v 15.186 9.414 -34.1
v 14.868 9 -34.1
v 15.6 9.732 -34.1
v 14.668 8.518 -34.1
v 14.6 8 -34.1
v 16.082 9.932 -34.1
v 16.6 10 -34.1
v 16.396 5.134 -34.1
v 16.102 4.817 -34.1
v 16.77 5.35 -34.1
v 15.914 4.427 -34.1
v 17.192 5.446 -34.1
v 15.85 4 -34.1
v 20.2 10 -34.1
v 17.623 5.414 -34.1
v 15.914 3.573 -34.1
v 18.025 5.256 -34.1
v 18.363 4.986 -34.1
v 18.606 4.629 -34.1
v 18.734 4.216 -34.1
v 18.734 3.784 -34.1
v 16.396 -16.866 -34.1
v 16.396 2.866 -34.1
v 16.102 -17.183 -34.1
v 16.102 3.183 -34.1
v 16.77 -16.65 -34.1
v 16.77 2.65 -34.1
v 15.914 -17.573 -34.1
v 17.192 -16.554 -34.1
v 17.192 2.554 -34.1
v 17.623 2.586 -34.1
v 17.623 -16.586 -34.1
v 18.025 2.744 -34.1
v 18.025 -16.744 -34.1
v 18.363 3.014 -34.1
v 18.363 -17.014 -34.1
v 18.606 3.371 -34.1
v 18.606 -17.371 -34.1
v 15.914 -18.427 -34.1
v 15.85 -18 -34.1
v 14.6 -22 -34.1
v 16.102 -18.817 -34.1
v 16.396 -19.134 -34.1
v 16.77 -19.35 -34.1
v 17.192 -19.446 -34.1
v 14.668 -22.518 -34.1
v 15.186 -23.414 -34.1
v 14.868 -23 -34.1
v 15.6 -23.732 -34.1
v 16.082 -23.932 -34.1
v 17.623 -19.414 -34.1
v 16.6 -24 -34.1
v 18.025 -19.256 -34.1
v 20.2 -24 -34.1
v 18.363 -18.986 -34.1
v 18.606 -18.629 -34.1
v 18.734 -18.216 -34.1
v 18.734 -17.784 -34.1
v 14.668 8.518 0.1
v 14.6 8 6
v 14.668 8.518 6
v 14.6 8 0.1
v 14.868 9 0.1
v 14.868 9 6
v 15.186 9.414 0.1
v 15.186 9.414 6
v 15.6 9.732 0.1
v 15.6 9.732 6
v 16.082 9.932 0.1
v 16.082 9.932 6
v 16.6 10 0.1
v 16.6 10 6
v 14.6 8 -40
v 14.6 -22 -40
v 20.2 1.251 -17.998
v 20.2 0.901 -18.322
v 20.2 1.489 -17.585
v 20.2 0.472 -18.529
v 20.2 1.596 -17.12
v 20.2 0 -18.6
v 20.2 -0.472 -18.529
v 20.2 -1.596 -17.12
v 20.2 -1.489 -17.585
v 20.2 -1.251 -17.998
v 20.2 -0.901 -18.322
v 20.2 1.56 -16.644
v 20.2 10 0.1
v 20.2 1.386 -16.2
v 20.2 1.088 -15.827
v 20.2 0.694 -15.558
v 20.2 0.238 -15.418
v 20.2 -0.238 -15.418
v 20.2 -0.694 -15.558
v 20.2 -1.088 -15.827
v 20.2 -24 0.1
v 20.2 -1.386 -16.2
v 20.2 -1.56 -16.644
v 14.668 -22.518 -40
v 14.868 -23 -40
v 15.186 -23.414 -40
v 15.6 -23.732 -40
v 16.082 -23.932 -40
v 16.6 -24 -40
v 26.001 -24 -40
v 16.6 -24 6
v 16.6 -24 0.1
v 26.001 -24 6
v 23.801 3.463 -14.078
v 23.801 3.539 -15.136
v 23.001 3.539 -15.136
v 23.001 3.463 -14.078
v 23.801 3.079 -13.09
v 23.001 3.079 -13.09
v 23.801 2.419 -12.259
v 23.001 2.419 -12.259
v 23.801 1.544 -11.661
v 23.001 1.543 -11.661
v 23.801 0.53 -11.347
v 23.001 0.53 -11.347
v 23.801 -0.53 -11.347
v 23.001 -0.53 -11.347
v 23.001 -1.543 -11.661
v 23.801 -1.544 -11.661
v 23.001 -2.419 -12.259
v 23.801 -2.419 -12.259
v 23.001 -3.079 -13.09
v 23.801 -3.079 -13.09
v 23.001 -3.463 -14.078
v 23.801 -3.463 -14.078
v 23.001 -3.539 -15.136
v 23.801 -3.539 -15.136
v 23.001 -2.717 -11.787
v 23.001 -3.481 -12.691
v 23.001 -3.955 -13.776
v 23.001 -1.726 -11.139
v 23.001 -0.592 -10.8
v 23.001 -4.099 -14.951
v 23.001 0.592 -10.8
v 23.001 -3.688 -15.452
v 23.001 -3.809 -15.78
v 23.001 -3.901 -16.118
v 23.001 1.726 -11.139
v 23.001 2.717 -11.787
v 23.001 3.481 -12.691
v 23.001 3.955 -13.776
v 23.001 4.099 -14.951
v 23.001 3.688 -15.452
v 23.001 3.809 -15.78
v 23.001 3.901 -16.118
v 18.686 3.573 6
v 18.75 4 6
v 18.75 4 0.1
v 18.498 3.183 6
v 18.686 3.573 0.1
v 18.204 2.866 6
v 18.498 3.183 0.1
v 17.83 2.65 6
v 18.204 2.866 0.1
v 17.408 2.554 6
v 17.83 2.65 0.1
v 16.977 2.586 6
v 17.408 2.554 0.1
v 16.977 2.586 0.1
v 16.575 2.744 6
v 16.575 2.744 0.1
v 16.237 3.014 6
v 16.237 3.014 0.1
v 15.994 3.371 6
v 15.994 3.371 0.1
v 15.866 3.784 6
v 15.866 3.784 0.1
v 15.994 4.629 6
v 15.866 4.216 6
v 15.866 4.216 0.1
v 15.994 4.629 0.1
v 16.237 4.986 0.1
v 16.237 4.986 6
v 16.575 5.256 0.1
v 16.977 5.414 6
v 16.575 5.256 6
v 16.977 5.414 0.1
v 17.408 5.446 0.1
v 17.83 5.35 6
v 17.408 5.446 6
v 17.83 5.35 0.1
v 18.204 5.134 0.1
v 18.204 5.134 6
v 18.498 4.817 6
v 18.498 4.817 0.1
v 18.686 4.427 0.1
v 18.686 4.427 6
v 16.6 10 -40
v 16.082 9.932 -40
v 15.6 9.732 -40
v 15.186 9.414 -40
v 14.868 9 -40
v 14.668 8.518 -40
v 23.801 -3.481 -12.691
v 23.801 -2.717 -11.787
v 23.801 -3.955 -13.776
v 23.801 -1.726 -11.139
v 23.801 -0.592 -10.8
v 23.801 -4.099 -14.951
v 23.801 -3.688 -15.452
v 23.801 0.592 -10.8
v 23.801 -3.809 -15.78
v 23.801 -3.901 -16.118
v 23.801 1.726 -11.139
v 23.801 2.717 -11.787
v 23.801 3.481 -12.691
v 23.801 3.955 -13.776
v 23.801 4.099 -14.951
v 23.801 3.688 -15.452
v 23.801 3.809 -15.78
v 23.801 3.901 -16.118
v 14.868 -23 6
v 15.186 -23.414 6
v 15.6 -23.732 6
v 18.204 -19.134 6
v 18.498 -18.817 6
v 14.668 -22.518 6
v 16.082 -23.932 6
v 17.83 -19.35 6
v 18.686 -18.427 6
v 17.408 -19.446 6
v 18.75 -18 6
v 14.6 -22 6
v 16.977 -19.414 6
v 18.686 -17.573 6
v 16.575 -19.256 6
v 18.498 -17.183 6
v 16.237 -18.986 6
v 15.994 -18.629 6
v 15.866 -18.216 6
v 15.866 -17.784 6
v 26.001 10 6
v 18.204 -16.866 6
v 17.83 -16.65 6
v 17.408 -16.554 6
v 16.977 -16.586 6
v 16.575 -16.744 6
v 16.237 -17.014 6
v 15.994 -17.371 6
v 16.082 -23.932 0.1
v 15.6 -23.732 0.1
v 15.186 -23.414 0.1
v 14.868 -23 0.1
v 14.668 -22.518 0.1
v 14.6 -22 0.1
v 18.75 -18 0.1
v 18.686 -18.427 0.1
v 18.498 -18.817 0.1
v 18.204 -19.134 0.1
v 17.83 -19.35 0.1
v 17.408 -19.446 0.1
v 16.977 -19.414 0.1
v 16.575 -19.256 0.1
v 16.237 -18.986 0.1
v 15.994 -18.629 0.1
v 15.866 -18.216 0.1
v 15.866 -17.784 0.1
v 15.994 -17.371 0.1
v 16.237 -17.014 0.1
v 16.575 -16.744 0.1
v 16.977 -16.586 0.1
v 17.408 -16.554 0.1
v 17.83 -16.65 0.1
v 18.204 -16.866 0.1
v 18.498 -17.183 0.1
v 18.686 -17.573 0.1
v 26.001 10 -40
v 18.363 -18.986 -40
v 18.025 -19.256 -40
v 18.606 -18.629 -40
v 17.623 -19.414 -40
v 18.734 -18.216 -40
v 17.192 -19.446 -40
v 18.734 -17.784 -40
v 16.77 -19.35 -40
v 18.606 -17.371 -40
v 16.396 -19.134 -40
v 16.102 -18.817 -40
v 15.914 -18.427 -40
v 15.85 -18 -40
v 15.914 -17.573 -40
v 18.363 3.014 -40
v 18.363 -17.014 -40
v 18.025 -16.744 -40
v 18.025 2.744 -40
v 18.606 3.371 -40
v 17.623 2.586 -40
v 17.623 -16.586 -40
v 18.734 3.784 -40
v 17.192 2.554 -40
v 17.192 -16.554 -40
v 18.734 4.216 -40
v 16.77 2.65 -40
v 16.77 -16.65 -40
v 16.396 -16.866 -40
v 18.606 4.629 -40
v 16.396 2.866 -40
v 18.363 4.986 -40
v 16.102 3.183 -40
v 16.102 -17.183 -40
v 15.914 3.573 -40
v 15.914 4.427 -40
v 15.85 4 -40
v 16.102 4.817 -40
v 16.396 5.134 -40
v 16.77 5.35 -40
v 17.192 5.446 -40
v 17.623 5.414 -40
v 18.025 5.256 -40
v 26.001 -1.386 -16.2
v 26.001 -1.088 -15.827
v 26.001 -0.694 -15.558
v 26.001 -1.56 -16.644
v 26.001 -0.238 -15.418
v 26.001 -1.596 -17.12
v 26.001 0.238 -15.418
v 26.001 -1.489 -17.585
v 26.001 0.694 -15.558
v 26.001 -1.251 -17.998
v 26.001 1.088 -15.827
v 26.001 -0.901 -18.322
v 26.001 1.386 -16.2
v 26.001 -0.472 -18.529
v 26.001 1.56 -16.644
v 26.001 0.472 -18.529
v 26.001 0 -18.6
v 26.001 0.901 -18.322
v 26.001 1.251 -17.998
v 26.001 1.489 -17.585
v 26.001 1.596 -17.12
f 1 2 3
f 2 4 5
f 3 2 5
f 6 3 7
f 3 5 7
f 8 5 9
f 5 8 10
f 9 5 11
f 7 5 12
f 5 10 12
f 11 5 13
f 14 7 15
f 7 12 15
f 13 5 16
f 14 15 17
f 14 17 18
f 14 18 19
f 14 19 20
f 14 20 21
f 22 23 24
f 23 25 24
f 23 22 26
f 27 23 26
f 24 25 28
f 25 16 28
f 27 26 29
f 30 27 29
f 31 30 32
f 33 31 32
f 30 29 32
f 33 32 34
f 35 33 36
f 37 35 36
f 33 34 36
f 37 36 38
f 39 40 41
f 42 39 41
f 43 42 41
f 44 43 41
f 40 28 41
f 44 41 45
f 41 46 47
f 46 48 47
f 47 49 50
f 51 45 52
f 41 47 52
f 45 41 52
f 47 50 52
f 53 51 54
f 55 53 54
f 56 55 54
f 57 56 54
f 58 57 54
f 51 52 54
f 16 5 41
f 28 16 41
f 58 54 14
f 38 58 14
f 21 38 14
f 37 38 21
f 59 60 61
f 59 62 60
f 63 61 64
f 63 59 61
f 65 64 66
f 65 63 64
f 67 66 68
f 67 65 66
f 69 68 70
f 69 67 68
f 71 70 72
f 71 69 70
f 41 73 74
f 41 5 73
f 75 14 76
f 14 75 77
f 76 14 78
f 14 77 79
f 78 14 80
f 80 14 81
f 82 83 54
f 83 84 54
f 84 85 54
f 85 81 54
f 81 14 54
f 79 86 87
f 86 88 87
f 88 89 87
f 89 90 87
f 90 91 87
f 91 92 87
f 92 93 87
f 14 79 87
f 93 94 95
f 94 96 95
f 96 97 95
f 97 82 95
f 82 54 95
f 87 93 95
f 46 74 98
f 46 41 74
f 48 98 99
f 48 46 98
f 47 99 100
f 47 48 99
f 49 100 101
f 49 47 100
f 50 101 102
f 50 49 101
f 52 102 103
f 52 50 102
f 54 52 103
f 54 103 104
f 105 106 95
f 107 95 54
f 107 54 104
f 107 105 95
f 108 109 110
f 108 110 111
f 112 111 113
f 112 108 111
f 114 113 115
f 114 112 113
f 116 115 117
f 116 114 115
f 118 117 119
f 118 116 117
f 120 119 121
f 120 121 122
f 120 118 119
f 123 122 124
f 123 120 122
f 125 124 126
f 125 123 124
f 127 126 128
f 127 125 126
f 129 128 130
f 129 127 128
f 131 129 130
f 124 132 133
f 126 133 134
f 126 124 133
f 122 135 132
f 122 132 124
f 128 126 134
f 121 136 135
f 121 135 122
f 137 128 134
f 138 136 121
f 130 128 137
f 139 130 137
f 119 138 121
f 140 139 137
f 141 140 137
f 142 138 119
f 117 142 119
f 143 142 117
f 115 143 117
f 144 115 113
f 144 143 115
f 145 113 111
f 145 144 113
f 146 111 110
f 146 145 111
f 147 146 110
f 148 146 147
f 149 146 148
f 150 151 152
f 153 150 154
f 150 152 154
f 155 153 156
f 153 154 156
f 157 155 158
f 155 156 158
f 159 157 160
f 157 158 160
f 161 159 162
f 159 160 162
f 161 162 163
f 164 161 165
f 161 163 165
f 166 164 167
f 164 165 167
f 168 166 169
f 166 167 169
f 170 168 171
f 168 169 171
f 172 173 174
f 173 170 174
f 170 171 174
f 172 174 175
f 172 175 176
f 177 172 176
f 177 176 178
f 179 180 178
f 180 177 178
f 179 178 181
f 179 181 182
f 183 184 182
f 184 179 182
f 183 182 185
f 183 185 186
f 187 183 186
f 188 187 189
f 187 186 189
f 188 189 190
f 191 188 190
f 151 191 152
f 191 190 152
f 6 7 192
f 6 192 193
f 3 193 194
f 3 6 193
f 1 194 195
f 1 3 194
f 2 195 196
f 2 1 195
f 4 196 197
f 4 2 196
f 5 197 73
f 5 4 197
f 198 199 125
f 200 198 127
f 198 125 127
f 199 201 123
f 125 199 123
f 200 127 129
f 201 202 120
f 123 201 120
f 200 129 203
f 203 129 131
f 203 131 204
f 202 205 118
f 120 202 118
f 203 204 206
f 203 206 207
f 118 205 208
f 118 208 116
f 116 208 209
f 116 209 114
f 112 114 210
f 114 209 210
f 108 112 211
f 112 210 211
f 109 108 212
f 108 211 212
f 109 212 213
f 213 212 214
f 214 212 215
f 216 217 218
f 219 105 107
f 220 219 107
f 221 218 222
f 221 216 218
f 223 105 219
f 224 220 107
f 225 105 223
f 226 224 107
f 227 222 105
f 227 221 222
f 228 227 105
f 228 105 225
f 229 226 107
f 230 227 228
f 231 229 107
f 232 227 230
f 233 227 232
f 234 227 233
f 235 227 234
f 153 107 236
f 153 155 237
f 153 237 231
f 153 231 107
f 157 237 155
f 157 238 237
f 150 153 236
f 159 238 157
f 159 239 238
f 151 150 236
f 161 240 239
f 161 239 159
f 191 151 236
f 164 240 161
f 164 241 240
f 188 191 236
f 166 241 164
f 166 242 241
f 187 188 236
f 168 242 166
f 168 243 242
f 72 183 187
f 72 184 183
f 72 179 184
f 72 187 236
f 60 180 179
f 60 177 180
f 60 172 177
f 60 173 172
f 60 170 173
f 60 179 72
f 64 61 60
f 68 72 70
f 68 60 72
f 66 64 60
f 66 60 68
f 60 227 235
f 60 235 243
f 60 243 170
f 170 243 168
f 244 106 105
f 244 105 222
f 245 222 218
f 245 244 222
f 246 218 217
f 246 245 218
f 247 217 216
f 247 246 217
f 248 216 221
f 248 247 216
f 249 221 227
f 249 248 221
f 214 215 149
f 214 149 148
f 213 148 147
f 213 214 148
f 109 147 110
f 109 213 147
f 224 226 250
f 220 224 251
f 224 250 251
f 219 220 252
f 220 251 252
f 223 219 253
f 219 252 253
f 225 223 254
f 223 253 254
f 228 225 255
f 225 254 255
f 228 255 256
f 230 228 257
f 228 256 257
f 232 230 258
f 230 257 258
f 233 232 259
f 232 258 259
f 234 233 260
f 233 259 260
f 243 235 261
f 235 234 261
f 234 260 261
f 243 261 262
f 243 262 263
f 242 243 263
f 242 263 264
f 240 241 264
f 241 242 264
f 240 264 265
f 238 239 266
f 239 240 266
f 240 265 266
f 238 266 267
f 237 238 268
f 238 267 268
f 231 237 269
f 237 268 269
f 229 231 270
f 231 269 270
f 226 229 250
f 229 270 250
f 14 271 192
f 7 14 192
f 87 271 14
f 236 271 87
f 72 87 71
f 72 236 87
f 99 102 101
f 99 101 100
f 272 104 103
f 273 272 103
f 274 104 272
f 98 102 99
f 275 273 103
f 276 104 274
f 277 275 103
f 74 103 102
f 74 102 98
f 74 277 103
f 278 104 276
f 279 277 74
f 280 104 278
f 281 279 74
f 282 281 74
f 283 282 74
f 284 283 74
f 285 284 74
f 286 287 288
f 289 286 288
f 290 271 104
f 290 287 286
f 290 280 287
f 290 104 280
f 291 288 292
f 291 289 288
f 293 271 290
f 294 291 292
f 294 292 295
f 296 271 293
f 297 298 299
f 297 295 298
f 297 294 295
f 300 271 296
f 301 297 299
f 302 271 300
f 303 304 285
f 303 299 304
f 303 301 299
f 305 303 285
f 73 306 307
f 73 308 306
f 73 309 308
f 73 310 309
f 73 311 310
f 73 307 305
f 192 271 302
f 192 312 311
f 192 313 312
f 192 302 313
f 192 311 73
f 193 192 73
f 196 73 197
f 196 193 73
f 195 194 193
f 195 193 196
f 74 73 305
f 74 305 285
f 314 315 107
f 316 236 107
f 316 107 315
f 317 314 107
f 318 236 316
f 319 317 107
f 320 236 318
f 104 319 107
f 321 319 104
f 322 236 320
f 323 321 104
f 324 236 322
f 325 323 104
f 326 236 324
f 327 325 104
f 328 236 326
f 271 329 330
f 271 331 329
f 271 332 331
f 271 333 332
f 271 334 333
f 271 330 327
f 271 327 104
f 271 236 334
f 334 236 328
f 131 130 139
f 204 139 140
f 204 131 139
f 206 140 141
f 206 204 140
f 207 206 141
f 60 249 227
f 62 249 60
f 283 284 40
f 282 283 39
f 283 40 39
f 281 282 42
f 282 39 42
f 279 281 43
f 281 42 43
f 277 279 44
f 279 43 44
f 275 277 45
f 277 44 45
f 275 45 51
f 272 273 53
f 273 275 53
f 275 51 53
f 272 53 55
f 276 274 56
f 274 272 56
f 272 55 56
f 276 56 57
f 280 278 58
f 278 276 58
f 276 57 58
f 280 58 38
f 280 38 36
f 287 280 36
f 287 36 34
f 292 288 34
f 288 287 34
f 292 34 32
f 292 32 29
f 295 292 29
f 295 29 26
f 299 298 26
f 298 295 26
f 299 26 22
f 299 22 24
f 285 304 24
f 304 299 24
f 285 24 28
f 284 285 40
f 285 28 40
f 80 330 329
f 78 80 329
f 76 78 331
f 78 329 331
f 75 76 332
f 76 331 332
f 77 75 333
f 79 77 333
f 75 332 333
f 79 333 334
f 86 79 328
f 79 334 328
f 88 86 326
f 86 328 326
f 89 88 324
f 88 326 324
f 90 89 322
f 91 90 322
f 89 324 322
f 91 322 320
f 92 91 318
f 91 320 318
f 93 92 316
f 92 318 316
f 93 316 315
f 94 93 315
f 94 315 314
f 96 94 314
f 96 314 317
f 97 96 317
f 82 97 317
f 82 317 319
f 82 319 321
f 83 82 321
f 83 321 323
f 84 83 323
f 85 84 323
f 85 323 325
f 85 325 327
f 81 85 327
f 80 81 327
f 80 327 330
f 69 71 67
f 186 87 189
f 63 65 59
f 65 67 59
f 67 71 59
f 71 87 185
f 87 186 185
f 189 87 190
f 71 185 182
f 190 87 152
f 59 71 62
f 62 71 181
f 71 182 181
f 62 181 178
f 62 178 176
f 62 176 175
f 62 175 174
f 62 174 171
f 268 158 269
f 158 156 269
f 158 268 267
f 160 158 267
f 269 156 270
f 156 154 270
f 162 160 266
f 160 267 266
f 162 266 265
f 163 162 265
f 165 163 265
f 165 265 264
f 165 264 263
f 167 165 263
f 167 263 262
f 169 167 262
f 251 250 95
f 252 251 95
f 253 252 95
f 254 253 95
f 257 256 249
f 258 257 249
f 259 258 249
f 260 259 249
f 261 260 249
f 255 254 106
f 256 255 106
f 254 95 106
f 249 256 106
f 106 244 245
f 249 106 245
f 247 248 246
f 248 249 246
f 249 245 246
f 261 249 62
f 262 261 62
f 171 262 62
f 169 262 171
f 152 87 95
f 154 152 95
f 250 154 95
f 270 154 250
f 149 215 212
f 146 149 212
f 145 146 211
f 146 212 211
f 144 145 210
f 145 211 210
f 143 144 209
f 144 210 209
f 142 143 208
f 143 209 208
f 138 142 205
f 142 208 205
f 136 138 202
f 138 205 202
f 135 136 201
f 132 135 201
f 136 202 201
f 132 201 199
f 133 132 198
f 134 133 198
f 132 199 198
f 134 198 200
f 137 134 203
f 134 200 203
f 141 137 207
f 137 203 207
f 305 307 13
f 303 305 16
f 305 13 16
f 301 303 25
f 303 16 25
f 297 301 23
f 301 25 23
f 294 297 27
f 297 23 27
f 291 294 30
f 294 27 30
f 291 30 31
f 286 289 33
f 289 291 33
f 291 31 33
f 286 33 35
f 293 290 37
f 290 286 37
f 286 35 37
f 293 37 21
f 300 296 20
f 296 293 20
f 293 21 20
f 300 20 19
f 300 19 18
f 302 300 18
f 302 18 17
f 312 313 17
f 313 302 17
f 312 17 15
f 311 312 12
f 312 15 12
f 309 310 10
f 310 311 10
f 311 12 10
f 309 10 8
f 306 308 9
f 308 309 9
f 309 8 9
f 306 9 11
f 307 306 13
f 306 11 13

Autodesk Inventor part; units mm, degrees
ref_plane "YZ Plane" through (0, 0, 0) normal (1, 0, 0) x (0, 1, 0)
ref_plane "XZ Plane" through (0, 0, 0) normal (0, 1, 0) x (-1, 0, 0)
ref_plane "XY Plane" through (0, 0, 0) normal (0, 0, 1) x (1, 0, 0)
ref_plane "작업 평면1" through (0, 0, 0) normal (0, 0, 1) x (1, 0, 0)
sketch "스케치1" plane through (0, 0, 0) normal (0, 0, 1) x (1, 0, 0)
  circle A0 centre (0, 0) radius 1.5 projected
  circle A1 centre (0, 0) radius 4.9 projected
  circle A2 centre (0, 0) radius 7.05 projected
  circle A3 centre (7.7781, 7.7783) radius 1.55 projected
  circle A4 centre (-7.7783, 7.7781) radius 1.55 projected
  circle A5 centre (-7.7781, -7.7783) radius 1.55 projected
  circle A6 centre (7.7783, -7.7781) radius 1.55 projected
  circle A7 centre (0, 0) radius 5 projected
  circle A8 centre (0, 0) radius 13.9 projected
  circle A9 centre (0.0001, -11) radius 1.55 projected
  circle A10 centre (-11, -0.0001) radius 1.55 projected
  circle A11 centre (-0.0001, 11) radius 1.55 projected
  circle A12 centre (11, 0.0001) radius 1.55 projected
  line L0 (0, 0) -> (-50, 0)
  line L1 (-15, 14.5) -> (-11.5, 14.5) projected
  line L2 (-15, 14.5) -> (-20.1, 8.5) projected
  line L3 (-20.1, 8.5) -> (-20.1, -44.6) projected
  line L4 (-20.1, -44.6) -> (-15, -50.6) projected
  line L5 (-15, -50.6) -> (15, -50.6) projected
  line L6 (15, -50.6) -> (20.1, -44.6) projected
  line L7 (20.1, -44.6) -> (20.1, 8.5) projected
  line L8 (20.1, 8.5) -> (15, 14.5) projected
  line L9 (11.5, 14.5) -> (15, 14.5) projected
  arc A13 (14.5, 11.5) -> (11.5, 14.5) centre (11.5, 11.5) ccw projected
  line L10 (14.5, -42) -> (14.5, 11.5) projected
  arc A14 (11.5, -45) -> (14.5, -42) centre (11.5, -42) ccw projected
  line L11 (-11.5, -45) -> (11.5, -45) projected
  arc A15 (-14.5, -42) -> (-11.5, -45) centre (-11.5, -42) ccw projected
  line L12 (-14.5, 11.5) -> (-14.5, -42) projected
  arc A16 (-11.5, 14.5) -> (-14.5, 11.5) centre (-11.5, 11.5) ccw projected
  circle A17 centre (17.3, 4) radius 1.35 projected
  circle A18 centre (17.3, -18) radius 1.35 projected
  circle A19 centre (17.3, -40) radius 1.35 projected
  circle A20 centre (11, -47.8) radius 1.35 projected
  circle A21 centre (-17.3, 4) radius 1.35 projected
  circle A22 centre (-17.3, -18) radius 1.35 projected
  circle A23 centre (-17.3, -40) radius 1.35 projected
  circle A24 centre (-11, -47.8) radius 1.35 projected
  circle A25 centre (-17.3, -18) radius 1.45
  circle A26 centre (-17.3, 4) radius 1.45
  arc A27 (-14.6, -42) -> (-11.5, -45.1) centre (-11.5, -42) ccw
  line L13 (-11.5, -45.1) -> (11.5, -45.1)
  arc A28 (11.5, -45.1) -> (14.6, -42) centre (11.5, -42) ccw
  line L14 (14.6, -22) -> (14.6, 8)
  arc A29 (14.6, 11.5) -> (12.5954, 14.4) centre (11.5, 11.5) ccw
  line L15 (12.5954, 14.4) -> (14.9538, 14.4)
  line L16 (14.9538, 14.4) -> (18.6938, 10)
  line L17 (20, -24) -> (20, -44.5632)
  line L18 (20, -44.5632) -> (14.9538, -50.5)
  line L19 (14.9538, -50.5) -> (-14.9538, -50.5)
  line L20 (-14.9538, -50.5) -> (-20, -44.5632)
  line L21 (-18.6938, 10) -> (-14.9538, 14.4)
  line L22 (-14.9538, 14.4) -> (-12.5954, 14.4)
  arc A30 (-12.5954, 14.4) -> (-14.6, 11.5) centre (-11.5, 11.5) ccw
  line L23 (-14.6, 11.5) -> (-14.6, -42)
  line L24 (-17.3, 4) -> (-17.3, 10)
  line L25 (-14.6, 10) -> (-18.0941, 10)
  line L26 (-17.3, -19.35) -> (-17.3, -24)
  line L27 (-14.6, -24) -> (-18.0059, -24)
  line L28 (-20, -44.5632) -> (-20, -24)
  line L29 (-20.0059, -22.0059) -> (-20.0941, 7.9941)
  arc A31 (-18.0941, 10) -> (-20.0941, 7.9941) centre (-18.0941, 8) ccw
  arc A32 (-20.0059, -22.0059) -> (-18.0059, -24) centre (-18.0059, -22) ccw
  line L30 (-36.7788, 11.5) -> (-35.2788, 11.5) projected
  line L31 (-36.7788, 11.5) -> (-36.7788, -41.5) projected
  line L32 (-35.2788, -41.5) -> (-36.7788, -41.5) projected
  spline S0 degree 3 poles (-34.7788, -41) (-34.788, -41.241) (-35.0376, -41.5) (-35.2788, -41.5) knots 0 0 0 0 1 1 1 1 projected
  line L33 (-34.7788, 11) -> (-34.7788, -41) projected
  ellipse E0 centre (-35.2788, 11) end of major axis (-35.2788, 11.5) minor radius 0.5 (-34.7788, 11) -> (-35.2788, 11.5) ccw projected
  line L34 (16.6, -24) -> (18.1, -24)
  line L35 (16.6, 10) -> (18.1, 10)
  line L36 (20.1, -22) -> (20.1, 8)
  circle A33 centre (17.3, 4) radius 1.45
  circle A34 centre (17.3, -18) radius 1.45
  line L37 (18.1, -24) -> (20.1, -24)
  line L38 (20.1, -24) -> (20.1, -22)
  arc A35 (14.6, -22) -> (16.6, -24) centre (16.6, -22) ccw
  line L39 (20.1, 8) -> (20.1, 10)
  line L40 (18.1, 10) -> (20.1, 10)
  arc A36 (16.6, 10) -> (14.6, 8) centre (16.6, 8) ccw
  point P0 (0, 0)
  point P1 (-20.1, 10)
  point P2 (-20.1, -24)
  point P3 (14.6, -24)
  point P4 (14.6, 10)
  point P5 (-19.9941, 8.6246)
  point P6 (-19.0167, 9.7745)
  point P7 (18.825, 10)
  point P8 (20.1, 8.5)
  dimension "d0" = 50
  dimension "d1" = 0.1
  dimension "d2" = 0.1
  dimension "d3" = 0.1
  dimension "d4" = 6
  dimension "d5" = 6
  dimension "d6" = 2
  dimension "d10" = 0.1
  dimension "d11" = 0.1
  dimension "d12" = 2
  dimension "d13" = 2
extrude "돌출1" add sketch "스케치1" along normal blind 6 contours L37 L34 A35 L14 A36 L35 L40 L8 L7 | L40 L39 L8
ref_plane "작업 평면2" through (0, 0, -34) normal (0, 0, -1) x (-1, 0, 0)
sketch "스케치2" plane through (0, 0, -34) normal (0, 0, -1) x (-1, 0, 0)
  line L0 (-16.6, -24) -> (-20.1, -24) projected
  line L1 (-20.1, -24) -> (-20.1, 10) projected
  line L2 (-20.1, 10) -> (-16.6, 10) projected
  arc A0 (-14.6, 8) -> (-16.6, 10) centre (-16.6, 8) ccw projected
  line L3 (-14.6, 8) -> (-14.6, -22) projected
  arc A1 (-16.6, -24) -> (-14.6, -22) centre (-16.6, -22) ccw projected
  circle A2 centre (-17.3, 4) radius 1.45 projected
  circle A3 centre (-17.3, -18) radius 1.45 projected
  point P0 (0, 0)
extrude "돌출2" add sketch "스케치2" along normal blind 6
sketch "스케치3" plane through (20.1, -24, -34) normal (1, 0, 0) x (0, 0, -1)
  line L0 (0, 34) -> (0, 0) projected
  line L1 (0, 0) -> (6, 0) projected
  line L2 (6, 34) -> (6, 0) projected
  line L3 (0, 34) -> (6, 34) projected
  line L4 (-34, 0) -> (-34, 34) projected
  line L5 (-34, 34) -> (-40, 34) projected
  line L6 (-40, 0) -> (-40, 34) projected
  line L7 (-34, 0) -> (-40, 0) projected
  line L8 (6, 0) -> (-40, 0)
  line L9 (-40, 0) -> (-40, 34)
  line L10 (-40, 34) -> (6, 34)
  line L11 (6, 34) -> (6, 0)
  point P0 (-34, 24)
extrude "돌출3" add sketch "스케치3" along normal blind 5.901
sketch "스케치4" plane through (26.001, -24, -34) normal (1, 0, 0) x (0, 0, -1)
  line L0 (-5.3426, 23.9933) -> (-5.3329, 43.9933) projected
  line L1 (-5.3329, 43.9933) -> (-32.9329, 44.0067) projected
  line L2 (-32.9329, 44.0067) -> (-32.9426, 24.0067) projected
  arc A0 (-32.9426, 24.0067) -> (-5.3426, 23.9933) centre (-19.1426, 24) ccw projected
  circle A1 centre (-11.3683, 16.218) radius 1.65 projected
  circle A2 centre (-19.148, 13) radius 1.65 projected
  circle A3 centre (-26.9246, 16.2256) radius 1.65 projected
  circle A4 centre (-30.1426, 24.0054) radius 1.65 projected
  circle A5 centre (-26.917, 31.782) radius 1.65 projected
  circle A6 centre (-19.1373, 35) radius 1.65 projected
  circle A7 centre (-11.3607, 31.7744) radius 1.65 projected
  circle A8 centre (-8.1426, 23.9946) radius 1.65 projected
  circle A9 centre (-19.1426, 24) radius 5.1 projected
  circle A10 centre (-19.1426, 24) radius 4.1
  point P0 (-34, 24)
  dimension "d26" = 8.2
extrude "돌출4" cut sketch "스케치4" against normal blind 3 contours A10
sketch "스케치6" plane through (26.001, -24, -34) normal (1, 0, 0) x (0, 0, -1)
  line L0 (-5.3426, 23.9933) -> (-5.3329, 43.9933) projected
  line L1 (-5.3329, 43.9933) -> (-32.9329, 44.0067) projected
  line L2 (-32.9329, 44.0067) -> (-32.9426, 24.0067) projected
  arc A0 (-32.9426, 24.0067) -> (-5.3426, 23.9933) centre (-19.1426, 24) ccw projected
  circle A1 centre (-11.3683, 16.218) radius 1.65 projected
  circle A2 centre (-19.148, 13) radius 1.65 projected
  circle A3 centre (-26.9246, 16.2256) radius 1.65 projected
  circle A4 centre (-30.1426, 24.0054) radius 1.65 projected
  circle A5 centre (-26.917, 31.782) radius 1.65 projected
  circle A6 centre (-19.1373, 35) radius 1.65 projected
  circle A7 centre (-11.3607, 31.7744) radius 1.65 projected
  circle A8 centre (-8.1426, 23.9946) radius 1.65 projected
  circle A9 centre (-19.1426, 24) radius 5.1 projected
  circle A10 centre (-19.1426, 24) radius 3.55
  circle A11 centre (-19.1426, 24) radius 4.1
  point P0 (-34, 24)
  dimension "d27" = 7.1
  dimension "d28" = 8.2
extrude "돌출6" add sketch "스케치6" against normal blind 2.2 contours A9 | A11
sketch "스케치7" plane through (16.6, -24, 0) normal (0, -1, 0) x (1, 0, 0)
  line L0 (0, 0) -> (3.5, 0) projected
  line L1 (3.5, 0) -> (3.5, -34) projected
  line L2 (3.5, -34) -> (0, -34) projected
  line L3 (0, -34) -> (0, -40) projected
  line L4 (0, -40) -> (9.401, -40) projected
  line L5 (9.401, 6) -> (9.401, -40) projected
  line L6 (0, 6) -> (9.401, 6) projected
  line L7 (0, 0) -> (0, 6) projected
  line L8 (0, -34) -> (-2, -34) projected
  line L9 (-2, -34) -> (-2, -40) projected
  line L10 (0, -40) -> (-2, -40) projected
  line L11 (0, -34) -> (0, -40) projected
  line L12 (-2, 0) -> (0, 0) projected
  line L13 (0, 0) -> (0, 6) projected
  line L14 (-2, 6) -> (0, 6) projected
  line L15 (-2, 0) -> (-2, 6) projected
  line L16 (3.6, -34.1) -> (3.6, 0.1)
  line L17 (3.6, 0.1) -> (0.1, 0.1)
  line L18 (0.1, 0.1) -> (0.1, 5.9)
  line L19 (0.1, 5.9) -> (9.301, 5.9)
  line L20 (9.301, 5.9) -> (9.301, -39.9)
  line L21 (9.301, -39.9) -> (0.1, -39.9)
  line L22 (0.1, -39.9) -> (0.1, -34.1)
  line L23 (0.1, -34.1) -> (3.6, -34.1)
  line L24 (-0.1, 0.1) -> (-1.9, 0.1)
  line L25 (-1.9, 0.1) -> (-1.9, 5.9)
  line L26 (-1.9, 5.9) -> (-0.1, 5.9)
  line L27 (-0.1, 5.9) -> (-0.1, 0.1)
  line L28 (-1.9, -34.1) -> (-0.1, -34.1)
  line L29 (-0.1, -34.1) -> (-0.1, -39.9)
  line L30 (-0.1, -39.9) -> (-1.9, -39.9)
  line L31 (-1.9, -39.9) -> (-1.9, -34.1)
  line L32 (3.6, -34.1) -> (3.6, 0.1)
  line L33 (3.6, 0.1) -> (-2, 0.1)
  line L34 (-2, 0.1) -> (-2, -34.1)
  line L35 (-2, -34.1) -> (3.6, -34.1)
  point P0 (-16.6, 0)
  point P1 (-1.9, 0.1)
  point P2 (-2, 0.1)
  point P3 (-2, -34.1)
  point P4 (0.1, -34.1)
  point P5 (0.1, 0.1)
  point P6 (-0.1, 0.1)
  dimension "d31" = 0.1
  dimension "d32" = 0.1
  dimension "d33" = 0.1
extrude "돌출7" cut sketch "스케치7" against normal through all contours L7 L33 L17 L16 L23 L35 L3 L2 L1 L0 | L12 L15 L33 L24 L7 | L0 L1 L2 L8 L34 L12 | L8 L3 L35 L28 L9
sketch "스케치8" plane through (26.001, -24, -34) normal (1, 0, 0) x (0, 0, -1)
  circle A0 centre (-19.1426, 24) radius 3.55
  line L0 (6, 34) -> (-40, 34) projected
  line L1 (-40, 34) -> (-40, 0) projected
  line L2 (-40, 0) -> (6, 0) projected
  line L3 (6, 0) -> (6, 34) projected
  line L4 (-34, -20.6) -> (-34, 32.5) projected
  line L5 (0, -20.6) -> (0, 32.5) projected
  circle A1 centre (-19.1426, 24) radius 3.55 projected
  circle A2 centre (-18.5217, 13.1058) radius 1.55 projected
  circle A3 centre (-6.1058, 22.4783) radius 1.55 projected
  circle A4 centre (-15.4783, 34.8942) radius 1.55 projected
  circle A5 centre (-27.8942, 25.5217) radius 1.55 projected
  circle A6 centre (-17, 24) radius 5 projected
  circle A7 centre (-17, 24) radius 13.9 projected
  circle A8 centre (-23.6274, 32.7794) radius 1.55 projected
  circle A9 centre (-8.2206, 30.6274) radius 1.55 projected
  circle A10 centre (-10.3726, 15.2206) radius 1.55 projected
  circle A11 centre (-25.7794, 17.3726) radius 1.55 projected
  circle A12 centre (-17, 24) radius 1.55
  dimension "d44" = 3.1
extrude "돌출8" cut sketch "스케치8" against normal through all contours A0 A12 | A0 A12
sketch "스케치9" plane through (26.001, -24, -34) normal (1, 0, 0) x (0, 0, -1)
  line L0 (6, 34) -> (-40, 34) projected
  line L1 (-40, 34) -> (-40, 0) projected
  line L2 (-40, 0) -> (6, 0) projected
  line L3 (6, 0) -> (6, 34) projected
  arc A0 (-15.6911, 24.8302) -> (-15.6911, 23.1698) centre (-19.1426, 24) ccw projected
  line L4 (0.1, 34) -> (-34.1, 34) projected
  line L5 (0.1, 0) -> (0.1, 34) projected
  line L6 (-34.1, 0) -> (0.1, 0) projected
  line L7 (-34.1, 0) -> (-34.1, 34) projected
  arc A1 (-15.6911, 23.1698) -> (-15.6911, 24.8302) centre (-17, 24) ccw projected
  point P0 (-34, 24)
extrude "돌출9" add sketch "스케치9" against normal up to surface (5.801 mm away) contours A1 A0
sketch "스케치10" plane through (26.001, -24, -34) normal (1, 0, 0) x (0, 0, -1)
  line L0 (6, 34) -> (-40, 34) projected
  line L1 (-40, 34) -> (-40, 0) projected
  line L2 (-40, 0) -> (6, 0) projected
  line L3 (6, 0) -> (6, 34) projected
  circle A0 centre (-17, 24) radius 4
  point P0 (-34, 24)
  dimension "d41" = 8
extrude "돌출10" add sketch "스케치10" against normal up to surface (5.801 mm away) contours A0
sketch "스케치11" plane through (26.001, -24, -34) normal (1, 0, 0) x (0, 0, -1)
  circle A0 centre (-18.5217, 13.1058) radius 1.55 projected
  circle A1 centre (-6.1058, 22.4783) radius 1.55 projected
  circle A2 centre (-15.4783, 34.8942) radius 1.55 projected
  circle A3 centre (-27.8942, 25.5217) radius 1.55 projected
  circle A4 centre (-17, 24) radius 5 projected
  circle A5 centre (-17, 24) radius 13.9 projected
  circle A6 centre (-23.6274, 32.7794) radius 1.55 projected
  circle A7 centre (-8.2206, 30.6274) radius 1.55 projected
  circle A8 centre (-10.3726, 15.2206) radius 1.55 projected
  circle A9 centre (-25.7794, 17.3726) radius 1.55 projected
  circle A10 centre (-17, 24) radius 1.6
  point P0 (-34, 24)
  dimension "d45" = 3.2
extrude "돌출11" cut sketch "스케치11" against normal blind 10 contours A10
properties part number "3" material "LCP 플라스틱"
